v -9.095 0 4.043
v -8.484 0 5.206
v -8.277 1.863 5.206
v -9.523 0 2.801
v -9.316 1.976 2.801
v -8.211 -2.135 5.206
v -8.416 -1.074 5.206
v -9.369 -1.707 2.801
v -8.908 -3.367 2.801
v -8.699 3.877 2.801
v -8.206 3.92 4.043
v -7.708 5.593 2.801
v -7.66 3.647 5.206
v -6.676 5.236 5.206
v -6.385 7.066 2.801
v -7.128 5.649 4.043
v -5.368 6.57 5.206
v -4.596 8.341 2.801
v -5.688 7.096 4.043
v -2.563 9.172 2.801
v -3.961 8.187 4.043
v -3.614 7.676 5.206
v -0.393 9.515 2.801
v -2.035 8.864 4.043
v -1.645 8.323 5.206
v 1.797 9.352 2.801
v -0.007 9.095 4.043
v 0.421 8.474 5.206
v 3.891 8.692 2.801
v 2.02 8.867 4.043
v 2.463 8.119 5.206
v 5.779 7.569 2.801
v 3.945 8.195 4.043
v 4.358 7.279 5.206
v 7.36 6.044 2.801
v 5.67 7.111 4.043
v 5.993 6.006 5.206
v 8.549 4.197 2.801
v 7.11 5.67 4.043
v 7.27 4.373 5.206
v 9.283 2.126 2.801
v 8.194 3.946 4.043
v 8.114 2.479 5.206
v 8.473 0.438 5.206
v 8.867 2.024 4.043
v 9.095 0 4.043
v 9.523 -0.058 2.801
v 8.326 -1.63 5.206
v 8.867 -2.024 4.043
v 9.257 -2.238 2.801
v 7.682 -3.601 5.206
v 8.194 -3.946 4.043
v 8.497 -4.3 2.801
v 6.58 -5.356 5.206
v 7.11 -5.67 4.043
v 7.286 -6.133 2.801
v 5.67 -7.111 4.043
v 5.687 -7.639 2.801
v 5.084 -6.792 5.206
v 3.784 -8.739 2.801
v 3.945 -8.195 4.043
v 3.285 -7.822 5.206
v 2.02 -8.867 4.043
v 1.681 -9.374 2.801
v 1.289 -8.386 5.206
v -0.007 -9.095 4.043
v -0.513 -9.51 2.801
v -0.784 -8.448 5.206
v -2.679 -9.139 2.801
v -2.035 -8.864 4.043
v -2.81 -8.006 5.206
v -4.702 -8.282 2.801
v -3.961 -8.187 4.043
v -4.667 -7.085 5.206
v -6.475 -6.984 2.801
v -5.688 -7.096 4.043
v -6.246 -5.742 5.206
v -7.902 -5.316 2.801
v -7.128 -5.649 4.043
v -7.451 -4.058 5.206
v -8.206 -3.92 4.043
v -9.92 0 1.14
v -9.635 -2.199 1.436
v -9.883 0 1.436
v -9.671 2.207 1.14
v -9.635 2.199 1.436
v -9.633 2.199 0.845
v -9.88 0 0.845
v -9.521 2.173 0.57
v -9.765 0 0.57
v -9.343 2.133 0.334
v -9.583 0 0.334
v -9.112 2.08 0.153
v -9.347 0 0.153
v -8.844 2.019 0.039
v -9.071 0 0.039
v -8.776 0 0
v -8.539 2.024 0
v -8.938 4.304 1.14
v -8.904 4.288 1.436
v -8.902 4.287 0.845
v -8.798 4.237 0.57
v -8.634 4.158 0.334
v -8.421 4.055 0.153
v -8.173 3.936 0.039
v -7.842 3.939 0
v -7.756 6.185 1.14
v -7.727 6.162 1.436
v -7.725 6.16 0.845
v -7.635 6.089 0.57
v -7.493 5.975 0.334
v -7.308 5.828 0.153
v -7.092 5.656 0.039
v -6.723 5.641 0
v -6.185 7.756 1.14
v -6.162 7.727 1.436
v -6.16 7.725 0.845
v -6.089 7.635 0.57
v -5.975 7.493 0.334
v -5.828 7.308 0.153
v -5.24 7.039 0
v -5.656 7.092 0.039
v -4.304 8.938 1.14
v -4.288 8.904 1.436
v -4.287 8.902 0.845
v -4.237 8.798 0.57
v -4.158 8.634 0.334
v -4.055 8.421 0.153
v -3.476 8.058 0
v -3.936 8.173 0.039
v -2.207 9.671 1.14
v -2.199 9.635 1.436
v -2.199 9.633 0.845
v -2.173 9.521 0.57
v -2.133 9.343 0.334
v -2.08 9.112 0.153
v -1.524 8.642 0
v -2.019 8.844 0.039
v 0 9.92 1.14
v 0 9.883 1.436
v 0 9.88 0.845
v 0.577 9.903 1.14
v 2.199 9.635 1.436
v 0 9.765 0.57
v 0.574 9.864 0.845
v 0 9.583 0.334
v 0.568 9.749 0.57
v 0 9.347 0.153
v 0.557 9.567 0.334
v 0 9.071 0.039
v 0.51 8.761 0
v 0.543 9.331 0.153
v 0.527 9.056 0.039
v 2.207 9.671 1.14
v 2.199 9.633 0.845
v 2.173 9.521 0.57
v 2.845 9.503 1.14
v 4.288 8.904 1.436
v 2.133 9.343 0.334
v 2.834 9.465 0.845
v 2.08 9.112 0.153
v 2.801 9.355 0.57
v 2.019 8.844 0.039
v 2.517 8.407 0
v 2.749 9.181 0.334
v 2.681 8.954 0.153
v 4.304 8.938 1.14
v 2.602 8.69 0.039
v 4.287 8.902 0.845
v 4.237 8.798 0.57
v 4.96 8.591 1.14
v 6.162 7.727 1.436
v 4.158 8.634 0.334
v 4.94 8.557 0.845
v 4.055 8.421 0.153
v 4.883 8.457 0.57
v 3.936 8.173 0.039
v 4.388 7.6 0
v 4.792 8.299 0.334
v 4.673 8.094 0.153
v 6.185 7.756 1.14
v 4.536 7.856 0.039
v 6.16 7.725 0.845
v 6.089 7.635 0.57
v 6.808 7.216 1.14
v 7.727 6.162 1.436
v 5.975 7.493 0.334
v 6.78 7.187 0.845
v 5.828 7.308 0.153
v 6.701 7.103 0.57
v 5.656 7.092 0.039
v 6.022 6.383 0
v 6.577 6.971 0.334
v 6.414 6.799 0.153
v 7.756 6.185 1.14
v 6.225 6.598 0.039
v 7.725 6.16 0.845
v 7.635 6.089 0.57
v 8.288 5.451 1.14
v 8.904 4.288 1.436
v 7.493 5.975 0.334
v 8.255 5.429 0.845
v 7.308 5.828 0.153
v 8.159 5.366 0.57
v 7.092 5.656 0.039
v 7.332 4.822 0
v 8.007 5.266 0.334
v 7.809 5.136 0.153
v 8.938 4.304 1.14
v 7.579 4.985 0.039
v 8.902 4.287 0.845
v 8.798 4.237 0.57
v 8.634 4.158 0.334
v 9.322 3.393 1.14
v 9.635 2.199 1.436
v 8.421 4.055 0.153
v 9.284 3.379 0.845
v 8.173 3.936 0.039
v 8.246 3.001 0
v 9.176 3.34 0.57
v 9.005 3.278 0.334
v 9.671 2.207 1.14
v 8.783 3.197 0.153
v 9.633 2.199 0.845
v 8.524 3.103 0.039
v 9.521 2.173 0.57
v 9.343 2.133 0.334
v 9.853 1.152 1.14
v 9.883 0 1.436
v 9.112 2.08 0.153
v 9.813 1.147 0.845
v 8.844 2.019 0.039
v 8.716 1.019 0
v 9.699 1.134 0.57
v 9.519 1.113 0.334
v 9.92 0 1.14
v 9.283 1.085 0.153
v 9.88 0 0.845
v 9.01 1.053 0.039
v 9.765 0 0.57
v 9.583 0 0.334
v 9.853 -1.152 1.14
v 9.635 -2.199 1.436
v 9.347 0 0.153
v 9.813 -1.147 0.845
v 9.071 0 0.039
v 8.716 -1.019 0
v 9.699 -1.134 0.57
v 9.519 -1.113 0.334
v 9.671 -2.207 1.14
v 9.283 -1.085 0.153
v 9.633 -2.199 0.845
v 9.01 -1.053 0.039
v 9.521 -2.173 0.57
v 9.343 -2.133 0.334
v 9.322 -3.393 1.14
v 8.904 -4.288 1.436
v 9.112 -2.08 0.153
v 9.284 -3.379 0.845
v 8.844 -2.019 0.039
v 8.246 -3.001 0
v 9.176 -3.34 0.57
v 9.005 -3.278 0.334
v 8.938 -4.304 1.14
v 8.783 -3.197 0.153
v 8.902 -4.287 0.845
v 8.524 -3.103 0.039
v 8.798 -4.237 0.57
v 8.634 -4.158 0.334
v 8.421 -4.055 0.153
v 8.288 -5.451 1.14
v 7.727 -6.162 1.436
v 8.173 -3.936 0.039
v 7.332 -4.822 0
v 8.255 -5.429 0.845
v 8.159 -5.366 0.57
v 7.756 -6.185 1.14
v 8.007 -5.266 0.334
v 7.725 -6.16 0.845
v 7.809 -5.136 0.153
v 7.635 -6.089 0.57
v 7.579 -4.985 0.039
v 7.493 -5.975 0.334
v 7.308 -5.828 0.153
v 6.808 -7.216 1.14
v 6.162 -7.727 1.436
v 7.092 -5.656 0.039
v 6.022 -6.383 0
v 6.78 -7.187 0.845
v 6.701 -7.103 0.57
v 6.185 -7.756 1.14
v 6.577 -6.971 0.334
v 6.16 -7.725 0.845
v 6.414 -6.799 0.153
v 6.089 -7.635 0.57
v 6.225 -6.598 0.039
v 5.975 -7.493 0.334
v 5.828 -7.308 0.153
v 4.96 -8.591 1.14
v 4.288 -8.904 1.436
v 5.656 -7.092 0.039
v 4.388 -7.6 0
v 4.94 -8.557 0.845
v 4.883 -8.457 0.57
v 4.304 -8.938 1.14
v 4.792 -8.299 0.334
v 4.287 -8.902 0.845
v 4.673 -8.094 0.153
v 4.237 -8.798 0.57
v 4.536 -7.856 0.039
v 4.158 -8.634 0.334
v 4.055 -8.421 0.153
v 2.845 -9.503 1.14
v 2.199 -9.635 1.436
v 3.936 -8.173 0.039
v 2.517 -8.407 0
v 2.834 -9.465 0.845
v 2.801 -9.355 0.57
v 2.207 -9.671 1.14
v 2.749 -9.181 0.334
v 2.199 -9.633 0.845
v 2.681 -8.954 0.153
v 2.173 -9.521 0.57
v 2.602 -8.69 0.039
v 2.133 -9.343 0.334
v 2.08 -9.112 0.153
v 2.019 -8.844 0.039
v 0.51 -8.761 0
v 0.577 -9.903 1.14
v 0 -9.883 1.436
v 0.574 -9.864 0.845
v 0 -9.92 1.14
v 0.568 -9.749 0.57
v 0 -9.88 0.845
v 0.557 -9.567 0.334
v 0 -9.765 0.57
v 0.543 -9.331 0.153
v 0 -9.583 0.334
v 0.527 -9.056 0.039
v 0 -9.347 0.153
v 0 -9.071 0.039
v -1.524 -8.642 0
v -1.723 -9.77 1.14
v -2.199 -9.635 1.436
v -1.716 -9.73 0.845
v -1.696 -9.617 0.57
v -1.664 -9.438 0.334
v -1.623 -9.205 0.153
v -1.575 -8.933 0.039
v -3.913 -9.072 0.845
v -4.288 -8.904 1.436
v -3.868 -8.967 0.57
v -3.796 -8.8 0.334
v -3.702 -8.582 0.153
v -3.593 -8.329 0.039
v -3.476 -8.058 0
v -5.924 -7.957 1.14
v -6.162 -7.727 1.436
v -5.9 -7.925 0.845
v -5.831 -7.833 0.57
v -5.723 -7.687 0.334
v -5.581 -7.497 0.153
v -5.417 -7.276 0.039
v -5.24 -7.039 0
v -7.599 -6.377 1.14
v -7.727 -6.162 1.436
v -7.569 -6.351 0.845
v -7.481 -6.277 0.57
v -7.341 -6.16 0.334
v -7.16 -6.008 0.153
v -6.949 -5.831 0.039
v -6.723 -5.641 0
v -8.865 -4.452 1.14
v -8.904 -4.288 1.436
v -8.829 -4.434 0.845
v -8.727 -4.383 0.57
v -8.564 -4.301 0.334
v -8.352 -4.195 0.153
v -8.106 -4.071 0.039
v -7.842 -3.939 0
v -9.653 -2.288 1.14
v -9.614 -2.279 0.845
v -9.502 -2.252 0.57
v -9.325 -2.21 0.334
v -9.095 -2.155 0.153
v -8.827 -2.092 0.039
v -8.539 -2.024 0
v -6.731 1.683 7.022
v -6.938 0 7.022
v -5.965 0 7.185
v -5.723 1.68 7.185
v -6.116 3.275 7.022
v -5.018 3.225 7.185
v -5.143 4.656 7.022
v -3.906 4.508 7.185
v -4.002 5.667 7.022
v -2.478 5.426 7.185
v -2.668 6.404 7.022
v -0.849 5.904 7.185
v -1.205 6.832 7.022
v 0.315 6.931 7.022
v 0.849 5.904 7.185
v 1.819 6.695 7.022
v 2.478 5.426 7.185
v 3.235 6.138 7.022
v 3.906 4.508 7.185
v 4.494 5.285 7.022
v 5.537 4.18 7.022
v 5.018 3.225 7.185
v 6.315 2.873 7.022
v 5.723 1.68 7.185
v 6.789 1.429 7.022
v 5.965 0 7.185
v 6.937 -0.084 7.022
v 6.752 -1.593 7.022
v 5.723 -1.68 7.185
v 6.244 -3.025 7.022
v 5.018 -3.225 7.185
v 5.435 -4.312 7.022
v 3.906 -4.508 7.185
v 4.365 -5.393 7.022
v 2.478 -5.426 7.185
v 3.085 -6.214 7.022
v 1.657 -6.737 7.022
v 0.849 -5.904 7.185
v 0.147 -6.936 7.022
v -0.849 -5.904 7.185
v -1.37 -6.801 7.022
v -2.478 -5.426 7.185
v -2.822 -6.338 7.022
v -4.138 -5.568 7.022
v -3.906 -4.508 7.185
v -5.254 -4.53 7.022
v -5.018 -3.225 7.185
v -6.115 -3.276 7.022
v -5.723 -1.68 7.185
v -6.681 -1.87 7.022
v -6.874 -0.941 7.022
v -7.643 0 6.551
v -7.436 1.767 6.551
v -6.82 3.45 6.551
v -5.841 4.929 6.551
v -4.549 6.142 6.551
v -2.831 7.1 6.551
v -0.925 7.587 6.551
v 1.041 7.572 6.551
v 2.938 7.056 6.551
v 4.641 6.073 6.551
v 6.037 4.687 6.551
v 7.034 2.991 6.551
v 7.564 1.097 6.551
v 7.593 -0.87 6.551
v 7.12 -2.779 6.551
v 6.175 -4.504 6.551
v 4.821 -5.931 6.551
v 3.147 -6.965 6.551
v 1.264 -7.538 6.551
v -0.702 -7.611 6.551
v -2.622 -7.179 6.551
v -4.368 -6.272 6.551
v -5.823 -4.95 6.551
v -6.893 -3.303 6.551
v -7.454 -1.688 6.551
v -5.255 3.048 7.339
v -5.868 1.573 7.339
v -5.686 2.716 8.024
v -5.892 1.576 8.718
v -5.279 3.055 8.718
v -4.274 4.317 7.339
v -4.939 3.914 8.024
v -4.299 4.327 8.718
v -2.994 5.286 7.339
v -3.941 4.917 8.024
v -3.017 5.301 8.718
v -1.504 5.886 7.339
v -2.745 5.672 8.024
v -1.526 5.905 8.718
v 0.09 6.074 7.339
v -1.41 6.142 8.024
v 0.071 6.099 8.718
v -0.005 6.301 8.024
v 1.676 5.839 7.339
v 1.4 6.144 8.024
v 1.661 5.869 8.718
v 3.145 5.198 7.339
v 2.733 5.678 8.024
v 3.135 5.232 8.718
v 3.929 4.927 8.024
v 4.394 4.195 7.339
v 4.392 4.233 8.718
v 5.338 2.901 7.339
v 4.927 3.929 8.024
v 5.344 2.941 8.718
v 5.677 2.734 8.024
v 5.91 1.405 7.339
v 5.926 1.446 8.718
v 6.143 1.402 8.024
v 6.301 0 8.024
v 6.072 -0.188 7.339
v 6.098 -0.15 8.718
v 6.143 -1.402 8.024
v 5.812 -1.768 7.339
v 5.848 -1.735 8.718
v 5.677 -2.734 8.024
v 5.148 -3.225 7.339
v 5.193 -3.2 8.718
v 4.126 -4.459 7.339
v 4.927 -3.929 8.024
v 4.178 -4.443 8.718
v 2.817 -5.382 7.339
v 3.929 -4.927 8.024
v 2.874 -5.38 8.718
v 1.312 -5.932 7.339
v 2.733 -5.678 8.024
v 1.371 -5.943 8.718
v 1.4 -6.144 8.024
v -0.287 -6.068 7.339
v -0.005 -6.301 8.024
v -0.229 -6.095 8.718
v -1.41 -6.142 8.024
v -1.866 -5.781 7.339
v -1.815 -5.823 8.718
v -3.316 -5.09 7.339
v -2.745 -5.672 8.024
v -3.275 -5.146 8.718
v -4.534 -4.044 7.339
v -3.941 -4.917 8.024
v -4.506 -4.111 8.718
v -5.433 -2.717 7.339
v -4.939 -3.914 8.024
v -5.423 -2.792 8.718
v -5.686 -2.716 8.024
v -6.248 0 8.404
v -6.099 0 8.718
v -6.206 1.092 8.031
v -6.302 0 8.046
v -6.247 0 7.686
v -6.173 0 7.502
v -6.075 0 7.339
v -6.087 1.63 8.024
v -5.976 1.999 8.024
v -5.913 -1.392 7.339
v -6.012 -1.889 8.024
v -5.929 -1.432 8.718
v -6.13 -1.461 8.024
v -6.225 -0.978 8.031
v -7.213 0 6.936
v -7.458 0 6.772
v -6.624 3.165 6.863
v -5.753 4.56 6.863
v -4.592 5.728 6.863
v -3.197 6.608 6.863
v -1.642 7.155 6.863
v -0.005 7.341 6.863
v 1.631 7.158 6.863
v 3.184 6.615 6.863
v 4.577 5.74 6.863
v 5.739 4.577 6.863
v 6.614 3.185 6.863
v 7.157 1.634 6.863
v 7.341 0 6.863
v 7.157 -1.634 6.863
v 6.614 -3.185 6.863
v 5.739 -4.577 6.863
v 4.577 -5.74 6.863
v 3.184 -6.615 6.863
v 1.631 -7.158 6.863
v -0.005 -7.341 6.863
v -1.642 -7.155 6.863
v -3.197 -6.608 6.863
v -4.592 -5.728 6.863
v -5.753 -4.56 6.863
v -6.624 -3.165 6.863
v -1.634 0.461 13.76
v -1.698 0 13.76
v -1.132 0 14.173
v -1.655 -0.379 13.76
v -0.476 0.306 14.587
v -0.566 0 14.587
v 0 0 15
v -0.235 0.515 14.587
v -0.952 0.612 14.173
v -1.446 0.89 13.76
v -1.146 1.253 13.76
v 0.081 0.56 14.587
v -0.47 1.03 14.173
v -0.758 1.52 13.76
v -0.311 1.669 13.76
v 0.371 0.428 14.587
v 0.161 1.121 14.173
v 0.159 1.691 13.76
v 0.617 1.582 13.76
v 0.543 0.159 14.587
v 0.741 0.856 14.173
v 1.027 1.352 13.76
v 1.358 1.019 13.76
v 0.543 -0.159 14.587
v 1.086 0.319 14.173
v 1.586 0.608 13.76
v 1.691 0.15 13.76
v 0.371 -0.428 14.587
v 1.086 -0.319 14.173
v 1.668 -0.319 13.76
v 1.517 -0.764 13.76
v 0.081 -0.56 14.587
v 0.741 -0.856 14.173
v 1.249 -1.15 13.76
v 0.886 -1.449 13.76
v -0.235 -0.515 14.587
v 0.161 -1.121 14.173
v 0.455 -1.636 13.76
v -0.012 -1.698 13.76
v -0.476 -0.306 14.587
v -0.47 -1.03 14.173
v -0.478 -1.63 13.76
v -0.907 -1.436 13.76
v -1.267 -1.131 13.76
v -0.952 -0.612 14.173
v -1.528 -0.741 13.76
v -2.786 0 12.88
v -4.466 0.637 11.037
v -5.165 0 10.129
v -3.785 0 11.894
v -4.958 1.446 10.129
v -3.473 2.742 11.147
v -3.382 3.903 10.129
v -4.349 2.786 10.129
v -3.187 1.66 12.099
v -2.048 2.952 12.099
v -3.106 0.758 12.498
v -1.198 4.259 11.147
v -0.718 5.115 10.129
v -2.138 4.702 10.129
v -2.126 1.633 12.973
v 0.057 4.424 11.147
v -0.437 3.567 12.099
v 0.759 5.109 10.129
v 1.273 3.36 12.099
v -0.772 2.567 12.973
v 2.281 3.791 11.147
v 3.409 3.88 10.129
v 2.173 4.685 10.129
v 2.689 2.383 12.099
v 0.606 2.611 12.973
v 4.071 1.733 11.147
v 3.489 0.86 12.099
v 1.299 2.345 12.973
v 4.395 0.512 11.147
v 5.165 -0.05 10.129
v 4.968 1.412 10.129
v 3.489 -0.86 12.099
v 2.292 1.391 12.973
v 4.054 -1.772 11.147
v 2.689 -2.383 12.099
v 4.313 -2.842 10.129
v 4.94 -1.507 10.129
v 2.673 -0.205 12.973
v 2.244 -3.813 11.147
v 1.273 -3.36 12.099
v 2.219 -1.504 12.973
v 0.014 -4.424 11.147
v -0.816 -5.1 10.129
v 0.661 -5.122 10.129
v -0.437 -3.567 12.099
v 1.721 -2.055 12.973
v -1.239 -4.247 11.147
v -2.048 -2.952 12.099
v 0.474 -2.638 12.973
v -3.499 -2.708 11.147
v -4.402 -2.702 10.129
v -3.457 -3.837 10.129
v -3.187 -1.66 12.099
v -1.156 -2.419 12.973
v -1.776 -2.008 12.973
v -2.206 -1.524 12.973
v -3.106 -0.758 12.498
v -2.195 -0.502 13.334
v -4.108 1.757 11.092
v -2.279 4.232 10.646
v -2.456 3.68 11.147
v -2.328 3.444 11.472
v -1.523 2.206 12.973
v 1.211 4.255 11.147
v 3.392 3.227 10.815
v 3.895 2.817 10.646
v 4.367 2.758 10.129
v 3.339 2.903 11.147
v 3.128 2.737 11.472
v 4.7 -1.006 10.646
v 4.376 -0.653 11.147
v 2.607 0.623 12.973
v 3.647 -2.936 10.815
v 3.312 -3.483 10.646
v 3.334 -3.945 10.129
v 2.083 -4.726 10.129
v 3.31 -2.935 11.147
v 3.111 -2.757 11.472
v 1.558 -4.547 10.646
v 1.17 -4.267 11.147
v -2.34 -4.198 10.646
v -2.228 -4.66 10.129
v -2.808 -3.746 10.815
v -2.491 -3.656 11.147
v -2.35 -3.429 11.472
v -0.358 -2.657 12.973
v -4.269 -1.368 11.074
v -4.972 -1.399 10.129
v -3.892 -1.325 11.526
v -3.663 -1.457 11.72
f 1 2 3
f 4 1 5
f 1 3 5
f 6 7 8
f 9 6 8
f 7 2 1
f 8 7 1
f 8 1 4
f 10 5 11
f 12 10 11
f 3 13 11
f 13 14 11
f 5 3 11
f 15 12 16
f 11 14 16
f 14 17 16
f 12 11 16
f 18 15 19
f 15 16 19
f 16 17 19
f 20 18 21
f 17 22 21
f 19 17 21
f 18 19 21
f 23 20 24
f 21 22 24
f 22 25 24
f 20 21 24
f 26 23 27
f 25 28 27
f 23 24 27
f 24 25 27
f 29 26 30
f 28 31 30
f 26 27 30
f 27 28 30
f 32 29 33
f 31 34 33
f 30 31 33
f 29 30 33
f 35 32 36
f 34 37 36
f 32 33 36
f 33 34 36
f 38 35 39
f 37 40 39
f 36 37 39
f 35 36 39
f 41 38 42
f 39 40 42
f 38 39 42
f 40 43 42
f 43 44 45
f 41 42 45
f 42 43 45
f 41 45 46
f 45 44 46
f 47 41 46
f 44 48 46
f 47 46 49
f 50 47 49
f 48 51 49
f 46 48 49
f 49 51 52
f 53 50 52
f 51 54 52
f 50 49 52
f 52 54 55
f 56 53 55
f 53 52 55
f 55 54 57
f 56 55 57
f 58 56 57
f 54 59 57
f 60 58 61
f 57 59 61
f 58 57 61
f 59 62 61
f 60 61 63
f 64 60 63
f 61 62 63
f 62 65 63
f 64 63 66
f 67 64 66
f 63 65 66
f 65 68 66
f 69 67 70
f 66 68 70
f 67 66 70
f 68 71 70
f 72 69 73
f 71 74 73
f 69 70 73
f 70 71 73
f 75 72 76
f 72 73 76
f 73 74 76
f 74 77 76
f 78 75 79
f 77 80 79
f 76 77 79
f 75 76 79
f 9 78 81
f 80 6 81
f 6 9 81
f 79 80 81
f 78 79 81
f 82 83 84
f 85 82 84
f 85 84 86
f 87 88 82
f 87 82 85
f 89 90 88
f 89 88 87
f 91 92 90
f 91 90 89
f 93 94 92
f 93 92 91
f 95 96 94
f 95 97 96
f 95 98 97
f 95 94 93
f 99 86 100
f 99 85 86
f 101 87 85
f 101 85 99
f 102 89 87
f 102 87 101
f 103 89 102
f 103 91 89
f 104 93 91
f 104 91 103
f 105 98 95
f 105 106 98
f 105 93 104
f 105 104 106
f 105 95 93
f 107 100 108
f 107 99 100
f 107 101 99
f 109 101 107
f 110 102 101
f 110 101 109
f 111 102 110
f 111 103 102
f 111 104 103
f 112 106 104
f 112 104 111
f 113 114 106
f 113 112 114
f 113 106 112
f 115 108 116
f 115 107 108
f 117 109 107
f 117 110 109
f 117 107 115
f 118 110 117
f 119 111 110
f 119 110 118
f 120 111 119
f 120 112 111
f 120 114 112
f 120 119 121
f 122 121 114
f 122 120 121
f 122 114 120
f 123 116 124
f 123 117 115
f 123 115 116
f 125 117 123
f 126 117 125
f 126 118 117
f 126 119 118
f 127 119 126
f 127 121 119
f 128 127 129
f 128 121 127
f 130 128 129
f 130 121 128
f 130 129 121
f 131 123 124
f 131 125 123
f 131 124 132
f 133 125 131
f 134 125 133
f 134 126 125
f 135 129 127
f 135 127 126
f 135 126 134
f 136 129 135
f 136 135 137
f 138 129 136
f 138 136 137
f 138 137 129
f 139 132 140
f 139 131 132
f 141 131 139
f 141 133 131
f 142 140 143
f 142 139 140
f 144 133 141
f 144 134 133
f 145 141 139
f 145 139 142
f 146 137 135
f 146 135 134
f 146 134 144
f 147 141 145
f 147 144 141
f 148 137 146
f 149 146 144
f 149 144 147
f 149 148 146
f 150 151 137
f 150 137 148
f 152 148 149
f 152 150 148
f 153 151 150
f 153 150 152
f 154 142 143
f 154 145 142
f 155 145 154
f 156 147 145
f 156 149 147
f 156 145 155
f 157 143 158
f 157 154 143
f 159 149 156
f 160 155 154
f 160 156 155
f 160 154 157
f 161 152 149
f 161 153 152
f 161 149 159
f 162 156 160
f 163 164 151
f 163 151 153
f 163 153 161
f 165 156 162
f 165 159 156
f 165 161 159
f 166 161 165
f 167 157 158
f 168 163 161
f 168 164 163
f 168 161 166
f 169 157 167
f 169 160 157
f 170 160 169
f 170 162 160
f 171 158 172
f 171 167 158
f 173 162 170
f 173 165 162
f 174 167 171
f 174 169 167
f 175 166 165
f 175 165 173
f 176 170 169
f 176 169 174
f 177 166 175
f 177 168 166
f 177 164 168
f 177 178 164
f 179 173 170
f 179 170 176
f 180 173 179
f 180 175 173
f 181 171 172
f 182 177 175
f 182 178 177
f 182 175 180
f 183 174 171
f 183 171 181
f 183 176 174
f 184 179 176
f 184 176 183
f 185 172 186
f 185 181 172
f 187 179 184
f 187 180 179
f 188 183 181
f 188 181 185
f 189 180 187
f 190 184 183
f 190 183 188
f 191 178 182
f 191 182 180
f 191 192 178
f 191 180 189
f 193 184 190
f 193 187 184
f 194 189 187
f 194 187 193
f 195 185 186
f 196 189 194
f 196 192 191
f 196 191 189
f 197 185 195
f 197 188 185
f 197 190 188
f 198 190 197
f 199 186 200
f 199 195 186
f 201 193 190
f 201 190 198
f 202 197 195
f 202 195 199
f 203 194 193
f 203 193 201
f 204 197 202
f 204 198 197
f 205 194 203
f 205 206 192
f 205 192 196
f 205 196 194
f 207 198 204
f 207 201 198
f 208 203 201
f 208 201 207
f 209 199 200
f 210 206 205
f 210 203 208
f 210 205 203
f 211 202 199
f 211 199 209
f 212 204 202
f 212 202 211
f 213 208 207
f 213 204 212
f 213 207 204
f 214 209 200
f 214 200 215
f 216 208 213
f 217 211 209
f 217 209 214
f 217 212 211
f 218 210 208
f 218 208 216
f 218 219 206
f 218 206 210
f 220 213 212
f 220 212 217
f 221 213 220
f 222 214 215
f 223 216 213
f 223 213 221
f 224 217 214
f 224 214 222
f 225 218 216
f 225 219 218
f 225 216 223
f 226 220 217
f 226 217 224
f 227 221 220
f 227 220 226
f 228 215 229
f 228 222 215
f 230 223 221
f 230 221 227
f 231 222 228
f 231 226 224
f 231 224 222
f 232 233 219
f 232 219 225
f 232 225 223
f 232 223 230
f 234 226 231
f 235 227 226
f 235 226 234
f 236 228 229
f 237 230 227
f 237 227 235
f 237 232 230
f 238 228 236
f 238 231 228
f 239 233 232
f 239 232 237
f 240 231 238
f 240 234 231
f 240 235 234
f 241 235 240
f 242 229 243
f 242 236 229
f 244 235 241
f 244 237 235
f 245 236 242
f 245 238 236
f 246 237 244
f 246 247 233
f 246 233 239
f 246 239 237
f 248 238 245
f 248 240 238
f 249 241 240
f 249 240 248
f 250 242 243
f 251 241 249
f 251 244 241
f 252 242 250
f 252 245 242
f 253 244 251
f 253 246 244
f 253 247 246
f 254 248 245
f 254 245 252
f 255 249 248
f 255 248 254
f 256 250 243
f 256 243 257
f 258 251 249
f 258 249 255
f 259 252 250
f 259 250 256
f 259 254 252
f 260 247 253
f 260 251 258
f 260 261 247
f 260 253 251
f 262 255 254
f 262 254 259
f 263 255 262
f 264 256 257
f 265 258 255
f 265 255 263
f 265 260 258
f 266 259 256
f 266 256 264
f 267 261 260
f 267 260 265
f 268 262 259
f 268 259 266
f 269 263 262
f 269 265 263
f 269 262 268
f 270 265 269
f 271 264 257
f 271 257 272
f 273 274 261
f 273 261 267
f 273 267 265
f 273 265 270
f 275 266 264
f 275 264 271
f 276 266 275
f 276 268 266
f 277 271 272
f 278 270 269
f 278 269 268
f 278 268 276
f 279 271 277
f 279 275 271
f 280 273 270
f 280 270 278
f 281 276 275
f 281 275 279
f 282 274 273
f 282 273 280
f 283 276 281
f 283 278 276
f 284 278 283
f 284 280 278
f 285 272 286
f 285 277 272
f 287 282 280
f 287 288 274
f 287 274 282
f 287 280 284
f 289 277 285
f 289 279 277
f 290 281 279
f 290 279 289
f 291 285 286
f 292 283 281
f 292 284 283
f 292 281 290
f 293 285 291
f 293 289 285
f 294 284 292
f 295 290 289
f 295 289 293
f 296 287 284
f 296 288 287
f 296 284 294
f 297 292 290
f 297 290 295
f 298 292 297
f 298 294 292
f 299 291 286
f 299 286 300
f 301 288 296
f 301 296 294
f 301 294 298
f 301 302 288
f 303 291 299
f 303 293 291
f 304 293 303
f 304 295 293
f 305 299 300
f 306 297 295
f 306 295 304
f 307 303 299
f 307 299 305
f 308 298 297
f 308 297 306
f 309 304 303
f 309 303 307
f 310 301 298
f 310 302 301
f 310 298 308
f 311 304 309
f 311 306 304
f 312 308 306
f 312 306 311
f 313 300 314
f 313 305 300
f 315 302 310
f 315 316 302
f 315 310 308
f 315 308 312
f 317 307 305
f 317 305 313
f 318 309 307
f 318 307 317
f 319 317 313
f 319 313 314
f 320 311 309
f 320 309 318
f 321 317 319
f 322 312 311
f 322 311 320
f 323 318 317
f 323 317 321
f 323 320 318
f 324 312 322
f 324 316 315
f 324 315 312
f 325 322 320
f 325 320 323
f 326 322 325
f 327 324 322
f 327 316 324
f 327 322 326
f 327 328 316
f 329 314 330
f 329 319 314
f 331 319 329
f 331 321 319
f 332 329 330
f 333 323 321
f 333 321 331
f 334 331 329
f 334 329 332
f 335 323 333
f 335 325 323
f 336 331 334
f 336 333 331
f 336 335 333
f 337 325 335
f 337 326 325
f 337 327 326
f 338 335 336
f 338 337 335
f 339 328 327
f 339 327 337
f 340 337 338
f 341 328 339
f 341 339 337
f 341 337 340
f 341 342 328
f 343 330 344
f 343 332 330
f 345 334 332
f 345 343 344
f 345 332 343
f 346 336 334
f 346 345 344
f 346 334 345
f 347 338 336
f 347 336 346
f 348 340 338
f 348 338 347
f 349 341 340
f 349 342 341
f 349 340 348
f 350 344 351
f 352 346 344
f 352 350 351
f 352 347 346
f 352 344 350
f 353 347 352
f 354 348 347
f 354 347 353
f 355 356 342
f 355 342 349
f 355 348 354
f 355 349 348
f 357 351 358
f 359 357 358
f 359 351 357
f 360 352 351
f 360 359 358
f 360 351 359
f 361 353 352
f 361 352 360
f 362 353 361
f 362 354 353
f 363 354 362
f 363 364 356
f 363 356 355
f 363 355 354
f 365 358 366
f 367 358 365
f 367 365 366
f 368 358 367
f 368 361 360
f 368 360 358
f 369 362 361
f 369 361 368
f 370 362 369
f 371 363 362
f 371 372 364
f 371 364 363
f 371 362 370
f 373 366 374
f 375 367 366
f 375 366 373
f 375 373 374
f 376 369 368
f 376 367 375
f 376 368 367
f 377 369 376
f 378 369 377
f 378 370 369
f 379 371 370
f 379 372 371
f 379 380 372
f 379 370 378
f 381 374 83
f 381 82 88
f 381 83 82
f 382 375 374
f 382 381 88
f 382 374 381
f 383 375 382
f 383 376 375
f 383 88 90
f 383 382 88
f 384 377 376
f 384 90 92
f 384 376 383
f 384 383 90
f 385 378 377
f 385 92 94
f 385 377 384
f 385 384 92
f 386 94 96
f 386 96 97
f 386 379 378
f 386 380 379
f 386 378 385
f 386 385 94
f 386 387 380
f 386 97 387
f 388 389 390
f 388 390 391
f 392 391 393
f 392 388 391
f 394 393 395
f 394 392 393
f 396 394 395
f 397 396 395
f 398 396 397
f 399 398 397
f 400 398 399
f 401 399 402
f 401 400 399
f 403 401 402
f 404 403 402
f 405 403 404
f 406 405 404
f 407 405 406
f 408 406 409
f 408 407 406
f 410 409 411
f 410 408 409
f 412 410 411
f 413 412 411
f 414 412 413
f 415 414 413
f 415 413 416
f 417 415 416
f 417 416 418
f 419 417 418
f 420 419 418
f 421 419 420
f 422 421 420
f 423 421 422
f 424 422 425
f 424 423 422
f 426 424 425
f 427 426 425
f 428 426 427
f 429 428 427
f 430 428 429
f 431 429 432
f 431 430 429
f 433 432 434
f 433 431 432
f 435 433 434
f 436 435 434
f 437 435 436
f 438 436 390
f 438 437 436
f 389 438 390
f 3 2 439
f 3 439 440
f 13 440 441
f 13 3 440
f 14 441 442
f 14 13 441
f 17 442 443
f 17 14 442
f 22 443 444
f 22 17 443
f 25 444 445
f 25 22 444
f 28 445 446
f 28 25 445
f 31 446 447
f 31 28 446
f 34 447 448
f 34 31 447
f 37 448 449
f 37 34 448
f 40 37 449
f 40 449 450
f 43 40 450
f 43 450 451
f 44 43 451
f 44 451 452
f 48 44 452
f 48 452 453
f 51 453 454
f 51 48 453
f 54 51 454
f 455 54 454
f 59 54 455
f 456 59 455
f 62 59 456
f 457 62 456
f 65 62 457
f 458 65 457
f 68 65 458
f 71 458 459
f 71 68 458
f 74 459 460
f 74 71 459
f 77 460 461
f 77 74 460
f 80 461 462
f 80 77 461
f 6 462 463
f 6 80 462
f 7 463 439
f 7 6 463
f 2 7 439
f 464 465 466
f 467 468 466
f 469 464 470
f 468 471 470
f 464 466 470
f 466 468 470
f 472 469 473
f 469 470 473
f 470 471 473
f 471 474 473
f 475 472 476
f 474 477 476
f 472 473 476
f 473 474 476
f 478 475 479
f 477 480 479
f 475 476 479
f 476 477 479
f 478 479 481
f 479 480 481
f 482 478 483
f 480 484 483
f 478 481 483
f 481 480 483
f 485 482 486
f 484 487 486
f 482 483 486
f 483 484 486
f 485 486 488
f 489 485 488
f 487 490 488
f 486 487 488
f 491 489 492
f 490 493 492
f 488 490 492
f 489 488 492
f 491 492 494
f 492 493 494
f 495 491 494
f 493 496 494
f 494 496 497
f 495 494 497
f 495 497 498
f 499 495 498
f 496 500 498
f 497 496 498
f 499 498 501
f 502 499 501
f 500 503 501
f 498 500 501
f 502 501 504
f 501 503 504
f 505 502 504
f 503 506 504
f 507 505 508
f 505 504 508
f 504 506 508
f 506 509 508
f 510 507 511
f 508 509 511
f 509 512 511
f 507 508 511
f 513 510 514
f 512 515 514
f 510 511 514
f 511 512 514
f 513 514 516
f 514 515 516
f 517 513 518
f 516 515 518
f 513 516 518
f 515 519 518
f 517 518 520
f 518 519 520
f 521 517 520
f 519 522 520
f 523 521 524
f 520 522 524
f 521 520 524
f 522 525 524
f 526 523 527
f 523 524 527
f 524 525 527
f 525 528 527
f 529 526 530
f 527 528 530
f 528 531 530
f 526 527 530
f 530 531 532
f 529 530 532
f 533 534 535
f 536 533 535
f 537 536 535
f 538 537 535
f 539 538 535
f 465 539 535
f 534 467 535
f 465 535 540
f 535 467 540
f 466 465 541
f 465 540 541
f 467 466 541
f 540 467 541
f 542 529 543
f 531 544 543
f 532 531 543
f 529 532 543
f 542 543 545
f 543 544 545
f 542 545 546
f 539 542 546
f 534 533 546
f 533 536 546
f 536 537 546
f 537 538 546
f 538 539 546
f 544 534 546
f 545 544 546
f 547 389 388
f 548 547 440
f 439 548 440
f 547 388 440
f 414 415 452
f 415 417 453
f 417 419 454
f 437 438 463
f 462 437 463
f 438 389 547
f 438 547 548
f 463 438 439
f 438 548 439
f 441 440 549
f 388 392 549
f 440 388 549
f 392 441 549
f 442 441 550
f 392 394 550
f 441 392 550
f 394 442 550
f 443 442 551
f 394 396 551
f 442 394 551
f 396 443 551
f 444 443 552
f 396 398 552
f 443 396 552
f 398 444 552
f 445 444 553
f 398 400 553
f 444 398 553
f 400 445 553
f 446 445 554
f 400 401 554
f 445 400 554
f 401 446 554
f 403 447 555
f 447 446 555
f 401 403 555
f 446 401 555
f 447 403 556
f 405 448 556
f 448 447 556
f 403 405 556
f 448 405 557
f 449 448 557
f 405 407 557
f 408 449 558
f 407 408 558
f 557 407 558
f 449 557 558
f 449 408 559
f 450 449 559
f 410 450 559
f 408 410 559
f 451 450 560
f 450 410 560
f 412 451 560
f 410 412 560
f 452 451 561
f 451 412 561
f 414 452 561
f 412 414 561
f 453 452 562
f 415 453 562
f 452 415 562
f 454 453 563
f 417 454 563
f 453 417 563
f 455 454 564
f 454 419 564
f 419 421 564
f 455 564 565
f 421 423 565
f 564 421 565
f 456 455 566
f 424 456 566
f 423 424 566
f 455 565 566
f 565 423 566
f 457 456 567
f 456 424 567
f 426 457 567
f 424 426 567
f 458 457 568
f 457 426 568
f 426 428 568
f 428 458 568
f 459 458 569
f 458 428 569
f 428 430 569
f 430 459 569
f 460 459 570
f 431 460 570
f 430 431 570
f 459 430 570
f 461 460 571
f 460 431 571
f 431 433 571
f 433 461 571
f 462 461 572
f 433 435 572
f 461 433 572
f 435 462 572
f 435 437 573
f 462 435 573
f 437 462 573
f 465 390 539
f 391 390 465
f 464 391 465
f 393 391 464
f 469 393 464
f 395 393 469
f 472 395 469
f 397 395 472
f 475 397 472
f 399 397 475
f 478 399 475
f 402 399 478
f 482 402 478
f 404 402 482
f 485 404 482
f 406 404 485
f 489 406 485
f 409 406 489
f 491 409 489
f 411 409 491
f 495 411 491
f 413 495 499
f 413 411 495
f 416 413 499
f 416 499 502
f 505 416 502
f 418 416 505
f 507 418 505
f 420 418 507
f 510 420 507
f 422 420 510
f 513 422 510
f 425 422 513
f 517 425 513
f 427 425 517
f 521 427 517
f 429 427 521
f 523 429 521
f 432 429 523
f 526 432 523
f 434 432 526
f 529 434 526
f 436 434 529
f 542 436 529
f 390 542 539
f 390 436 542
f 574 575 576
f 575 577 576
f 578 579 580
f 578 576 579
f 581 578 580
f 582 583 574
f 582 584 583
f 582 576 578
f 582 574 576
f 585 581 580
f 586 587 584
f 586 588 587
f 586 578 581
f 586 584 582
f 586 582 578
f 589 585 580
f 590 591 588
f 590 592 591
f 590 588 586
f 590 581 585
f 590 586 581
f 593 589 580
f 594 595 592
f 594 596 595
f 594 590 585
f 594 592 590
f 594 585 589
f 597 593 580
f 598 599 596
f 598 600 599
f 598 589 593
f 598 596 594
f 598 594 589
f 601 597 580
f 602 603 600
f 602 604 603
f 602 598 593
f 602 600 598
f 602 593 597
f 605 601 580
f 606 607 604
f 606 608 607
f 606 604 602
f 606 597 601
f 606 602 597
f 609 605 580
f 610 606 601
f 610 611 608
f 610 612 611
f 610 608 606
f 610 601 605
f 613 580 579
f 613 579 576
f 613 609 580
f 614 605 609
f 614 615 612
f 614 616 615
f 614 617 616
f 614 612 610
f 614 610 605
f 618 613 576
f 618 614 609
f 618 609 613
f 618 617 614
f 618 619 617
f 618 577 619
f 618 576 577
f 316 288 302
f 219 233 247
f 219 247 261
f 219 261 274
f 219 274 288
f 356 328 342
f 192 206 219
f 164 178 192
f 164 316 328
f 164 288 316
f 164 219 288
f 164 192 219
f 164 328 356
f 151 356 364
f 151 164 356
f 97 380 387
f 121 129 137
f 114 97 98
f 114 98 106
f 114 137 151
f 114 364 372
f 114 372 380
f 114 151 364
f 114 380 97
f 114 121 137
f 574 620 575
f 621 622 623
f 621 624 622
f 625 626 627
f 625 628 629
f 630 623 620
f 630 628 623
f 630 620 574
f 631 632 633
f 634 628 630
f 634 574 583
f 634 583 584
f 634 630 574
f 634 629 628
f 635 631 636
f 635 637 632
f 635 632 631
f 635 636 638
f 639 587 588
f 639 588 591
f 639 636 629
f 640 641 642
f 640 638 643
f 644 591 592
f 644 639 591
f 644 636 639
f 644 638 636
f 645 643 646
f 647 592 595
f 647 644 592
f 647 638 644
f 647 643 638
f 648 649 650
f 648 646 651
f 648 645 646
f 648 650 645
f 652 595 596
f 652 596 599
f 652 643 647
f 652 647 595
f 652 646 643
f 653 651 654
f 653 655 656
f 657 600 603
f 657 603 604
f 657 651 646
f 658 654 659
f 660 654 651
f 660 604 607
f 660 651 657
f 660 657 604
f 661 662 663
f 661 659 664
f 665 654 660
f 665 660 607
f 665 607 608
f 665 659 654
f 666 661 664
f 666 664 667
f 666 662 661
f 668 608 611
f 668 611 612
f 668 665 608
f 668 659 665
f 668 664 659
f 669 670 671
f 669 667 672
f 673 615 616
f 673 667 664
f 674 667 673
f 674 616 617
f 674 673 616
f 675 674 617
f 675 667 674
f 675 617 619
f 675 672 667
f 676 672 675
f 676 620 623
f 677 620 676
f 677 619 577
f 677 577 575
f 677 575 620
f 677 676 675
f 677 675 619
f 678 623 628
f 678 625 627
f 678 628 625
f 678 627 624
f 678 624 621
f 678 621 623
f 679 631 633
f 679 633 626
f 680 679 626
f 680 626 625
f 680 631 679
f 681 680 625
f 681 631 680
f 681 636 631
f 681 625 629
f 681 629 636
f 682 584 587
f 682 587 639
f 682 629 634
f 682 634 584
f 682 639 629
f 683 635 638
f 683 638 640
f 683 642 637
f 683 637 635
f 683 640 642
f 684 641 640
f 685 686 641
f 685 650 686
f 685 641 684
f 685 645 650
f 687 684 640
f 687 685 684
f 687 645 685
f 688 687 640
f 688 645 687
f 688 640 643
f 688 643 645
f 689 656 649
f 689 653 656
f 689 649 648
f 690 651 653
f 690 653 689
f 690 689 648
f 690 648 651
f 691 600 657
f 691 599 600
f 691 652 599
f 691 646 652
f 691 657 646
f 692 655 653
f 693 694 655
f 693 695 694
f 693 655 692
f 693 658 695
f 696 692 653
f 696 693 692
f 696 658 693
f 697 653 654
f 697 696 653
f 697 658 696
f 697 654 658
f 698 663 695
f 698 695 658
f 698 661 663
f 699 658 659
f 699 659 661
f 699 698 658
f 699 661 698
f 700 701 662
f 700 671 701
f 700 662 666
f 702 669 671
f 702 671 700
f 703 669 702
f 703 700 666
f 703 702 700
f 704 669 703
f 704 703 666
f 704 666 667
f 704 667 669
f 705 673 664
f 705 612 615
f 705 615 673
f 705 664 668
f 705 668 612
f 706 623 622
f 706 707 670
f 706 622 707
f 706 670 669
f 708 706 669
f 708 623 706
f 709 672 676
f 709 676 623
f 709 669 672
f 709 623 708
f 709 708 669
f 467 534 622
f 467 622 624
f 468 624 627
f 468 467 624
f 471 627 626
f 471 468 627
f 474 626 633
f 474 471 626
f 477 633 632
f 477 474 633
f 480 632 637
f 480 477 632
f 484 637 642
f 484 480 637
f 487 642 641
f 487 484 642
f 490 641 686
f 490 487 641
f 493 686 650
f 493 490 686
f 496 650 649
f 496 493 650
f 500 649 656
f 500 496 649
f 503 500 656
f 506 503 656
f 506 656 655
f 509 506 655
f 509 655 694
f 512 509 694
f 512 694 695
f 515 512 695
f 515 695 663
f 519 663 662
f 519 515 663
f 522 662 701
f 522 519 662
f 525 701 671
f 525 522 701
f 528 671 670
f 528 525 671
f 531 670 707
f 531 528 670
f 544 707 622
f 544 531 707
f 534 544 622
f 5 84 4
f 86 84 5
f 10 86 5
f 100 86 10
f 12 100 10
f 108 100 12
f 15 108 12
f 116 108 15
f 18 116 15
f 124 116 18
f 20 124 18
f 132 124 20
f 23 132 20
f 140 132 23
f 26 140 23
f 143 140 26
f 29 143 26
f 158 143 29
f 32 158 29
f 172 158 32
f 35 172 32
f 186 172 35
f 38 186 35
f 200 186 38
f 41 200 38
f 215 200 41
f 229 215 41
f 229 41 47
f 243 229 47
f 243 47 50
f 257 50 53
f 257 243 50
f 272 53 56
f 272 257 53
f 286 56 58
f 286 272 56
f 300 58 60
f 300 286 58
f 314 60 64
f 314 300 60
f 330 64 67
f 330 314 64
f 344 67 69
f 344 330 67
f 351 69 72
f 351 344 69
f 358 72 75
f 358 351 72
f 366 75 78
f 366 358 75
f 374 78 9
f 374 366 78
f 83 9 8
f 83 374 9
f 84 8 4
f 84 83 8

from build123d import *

# Parameters (mm, degrees)
F2_R = 1.216625
F3_R = 1.031815
F4_R = 1.144544
F5_R = 14.206331
F6_R = 8.725041


with BuildPart() as f1:
    # F0 (on Front) → F1 (revolve)
    with BuildSketch(Plane.XZ):
        Polygon((-10.26025, 0), (0, 0), (0, 15), (-3.757334, 12.255651), (-6.561344, 8.019807), (-5.964746, 7.184571), (-7.39658, 6.945931), (-9.186374, 4.082262), align=None)
    revolve(axis=Axis((0, 0, 7.5), (0, 0, -1)))

    # F2
    f2_edges = [f1.edges().sort_by_distance(p)[0] for p in [
        (6.561344, 0, 8.019807),
    ]]
    fillet(f2_edges, radius=F2_R)

    # F3
    f3_edges = [f1.edges().sort_by_distance(p)[0] for p in [
        (7.39658, 0, 6.945931),
    ]]
    fillet(f3_edges, radius=F3_R)

    # F4
    f4_edges = [f1.edges().sort_by_distance(p)[0] for p in [
        (10.26025, 0, 0),
    ]]
    fillet(f4_edges, radius=F4_R)

    # F5
    f5_edges = [f1.edges().sort_by_distance(p)[0] for p in [
        (3.757334, 0, 12.255651),
    ]]
    fillet(f5_edges, radius=F5_R)

    # F6
    f6_edges = [f1.edges().sort_by_distance(p)[0] for p in [
        (9.186374, 0, 4.082262),
    ]]
    fillet(f6_edges, radius=F6_R)


solid = f1.part
